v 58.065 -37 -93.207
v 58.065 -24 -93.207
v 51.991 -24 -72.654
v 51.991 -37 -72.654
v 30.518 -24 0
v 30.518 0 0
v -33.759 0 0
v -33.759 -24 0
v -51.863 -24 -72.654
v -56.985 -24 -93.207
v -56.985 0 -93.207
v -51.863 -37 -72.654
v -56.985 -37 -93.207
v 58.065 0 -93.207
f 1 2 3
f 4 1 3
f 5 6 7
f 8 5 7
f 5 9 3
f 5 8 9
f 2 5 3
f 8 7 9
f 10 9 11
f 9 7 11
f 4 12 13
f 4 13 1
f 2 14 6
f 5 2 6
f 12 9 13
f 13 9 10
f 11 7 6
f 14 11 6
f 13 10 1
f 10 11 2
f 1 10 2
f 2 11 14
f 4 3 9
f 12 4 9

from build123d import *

# Parameters (mm, degrees)
F1_DEPTH = 24
F3_DEPTH = 13


with BuildPart() as f1:
    # F0 (on Front) → F1 (new body)
    with BuildSketch(Plane.XZ):
        Polygon((30.517951, 0), (-33.758782, 0), (-56.984834, -93.20651), (58.065102, -93.20651), align=None)
    extrude(amount=F1_DEPTH)

    # F2 (on face) → F3 (join)
    with BuildSketch(Plane.XZ.offset(24)):
        Polygon((-51.863408, -72.654148), (-56.984834, -93.20651), (58.065102, -93.20651), (51.990858, -72.654148), align=None)
    extrude(amount=F3_DEPTH)


solid = f1.part
